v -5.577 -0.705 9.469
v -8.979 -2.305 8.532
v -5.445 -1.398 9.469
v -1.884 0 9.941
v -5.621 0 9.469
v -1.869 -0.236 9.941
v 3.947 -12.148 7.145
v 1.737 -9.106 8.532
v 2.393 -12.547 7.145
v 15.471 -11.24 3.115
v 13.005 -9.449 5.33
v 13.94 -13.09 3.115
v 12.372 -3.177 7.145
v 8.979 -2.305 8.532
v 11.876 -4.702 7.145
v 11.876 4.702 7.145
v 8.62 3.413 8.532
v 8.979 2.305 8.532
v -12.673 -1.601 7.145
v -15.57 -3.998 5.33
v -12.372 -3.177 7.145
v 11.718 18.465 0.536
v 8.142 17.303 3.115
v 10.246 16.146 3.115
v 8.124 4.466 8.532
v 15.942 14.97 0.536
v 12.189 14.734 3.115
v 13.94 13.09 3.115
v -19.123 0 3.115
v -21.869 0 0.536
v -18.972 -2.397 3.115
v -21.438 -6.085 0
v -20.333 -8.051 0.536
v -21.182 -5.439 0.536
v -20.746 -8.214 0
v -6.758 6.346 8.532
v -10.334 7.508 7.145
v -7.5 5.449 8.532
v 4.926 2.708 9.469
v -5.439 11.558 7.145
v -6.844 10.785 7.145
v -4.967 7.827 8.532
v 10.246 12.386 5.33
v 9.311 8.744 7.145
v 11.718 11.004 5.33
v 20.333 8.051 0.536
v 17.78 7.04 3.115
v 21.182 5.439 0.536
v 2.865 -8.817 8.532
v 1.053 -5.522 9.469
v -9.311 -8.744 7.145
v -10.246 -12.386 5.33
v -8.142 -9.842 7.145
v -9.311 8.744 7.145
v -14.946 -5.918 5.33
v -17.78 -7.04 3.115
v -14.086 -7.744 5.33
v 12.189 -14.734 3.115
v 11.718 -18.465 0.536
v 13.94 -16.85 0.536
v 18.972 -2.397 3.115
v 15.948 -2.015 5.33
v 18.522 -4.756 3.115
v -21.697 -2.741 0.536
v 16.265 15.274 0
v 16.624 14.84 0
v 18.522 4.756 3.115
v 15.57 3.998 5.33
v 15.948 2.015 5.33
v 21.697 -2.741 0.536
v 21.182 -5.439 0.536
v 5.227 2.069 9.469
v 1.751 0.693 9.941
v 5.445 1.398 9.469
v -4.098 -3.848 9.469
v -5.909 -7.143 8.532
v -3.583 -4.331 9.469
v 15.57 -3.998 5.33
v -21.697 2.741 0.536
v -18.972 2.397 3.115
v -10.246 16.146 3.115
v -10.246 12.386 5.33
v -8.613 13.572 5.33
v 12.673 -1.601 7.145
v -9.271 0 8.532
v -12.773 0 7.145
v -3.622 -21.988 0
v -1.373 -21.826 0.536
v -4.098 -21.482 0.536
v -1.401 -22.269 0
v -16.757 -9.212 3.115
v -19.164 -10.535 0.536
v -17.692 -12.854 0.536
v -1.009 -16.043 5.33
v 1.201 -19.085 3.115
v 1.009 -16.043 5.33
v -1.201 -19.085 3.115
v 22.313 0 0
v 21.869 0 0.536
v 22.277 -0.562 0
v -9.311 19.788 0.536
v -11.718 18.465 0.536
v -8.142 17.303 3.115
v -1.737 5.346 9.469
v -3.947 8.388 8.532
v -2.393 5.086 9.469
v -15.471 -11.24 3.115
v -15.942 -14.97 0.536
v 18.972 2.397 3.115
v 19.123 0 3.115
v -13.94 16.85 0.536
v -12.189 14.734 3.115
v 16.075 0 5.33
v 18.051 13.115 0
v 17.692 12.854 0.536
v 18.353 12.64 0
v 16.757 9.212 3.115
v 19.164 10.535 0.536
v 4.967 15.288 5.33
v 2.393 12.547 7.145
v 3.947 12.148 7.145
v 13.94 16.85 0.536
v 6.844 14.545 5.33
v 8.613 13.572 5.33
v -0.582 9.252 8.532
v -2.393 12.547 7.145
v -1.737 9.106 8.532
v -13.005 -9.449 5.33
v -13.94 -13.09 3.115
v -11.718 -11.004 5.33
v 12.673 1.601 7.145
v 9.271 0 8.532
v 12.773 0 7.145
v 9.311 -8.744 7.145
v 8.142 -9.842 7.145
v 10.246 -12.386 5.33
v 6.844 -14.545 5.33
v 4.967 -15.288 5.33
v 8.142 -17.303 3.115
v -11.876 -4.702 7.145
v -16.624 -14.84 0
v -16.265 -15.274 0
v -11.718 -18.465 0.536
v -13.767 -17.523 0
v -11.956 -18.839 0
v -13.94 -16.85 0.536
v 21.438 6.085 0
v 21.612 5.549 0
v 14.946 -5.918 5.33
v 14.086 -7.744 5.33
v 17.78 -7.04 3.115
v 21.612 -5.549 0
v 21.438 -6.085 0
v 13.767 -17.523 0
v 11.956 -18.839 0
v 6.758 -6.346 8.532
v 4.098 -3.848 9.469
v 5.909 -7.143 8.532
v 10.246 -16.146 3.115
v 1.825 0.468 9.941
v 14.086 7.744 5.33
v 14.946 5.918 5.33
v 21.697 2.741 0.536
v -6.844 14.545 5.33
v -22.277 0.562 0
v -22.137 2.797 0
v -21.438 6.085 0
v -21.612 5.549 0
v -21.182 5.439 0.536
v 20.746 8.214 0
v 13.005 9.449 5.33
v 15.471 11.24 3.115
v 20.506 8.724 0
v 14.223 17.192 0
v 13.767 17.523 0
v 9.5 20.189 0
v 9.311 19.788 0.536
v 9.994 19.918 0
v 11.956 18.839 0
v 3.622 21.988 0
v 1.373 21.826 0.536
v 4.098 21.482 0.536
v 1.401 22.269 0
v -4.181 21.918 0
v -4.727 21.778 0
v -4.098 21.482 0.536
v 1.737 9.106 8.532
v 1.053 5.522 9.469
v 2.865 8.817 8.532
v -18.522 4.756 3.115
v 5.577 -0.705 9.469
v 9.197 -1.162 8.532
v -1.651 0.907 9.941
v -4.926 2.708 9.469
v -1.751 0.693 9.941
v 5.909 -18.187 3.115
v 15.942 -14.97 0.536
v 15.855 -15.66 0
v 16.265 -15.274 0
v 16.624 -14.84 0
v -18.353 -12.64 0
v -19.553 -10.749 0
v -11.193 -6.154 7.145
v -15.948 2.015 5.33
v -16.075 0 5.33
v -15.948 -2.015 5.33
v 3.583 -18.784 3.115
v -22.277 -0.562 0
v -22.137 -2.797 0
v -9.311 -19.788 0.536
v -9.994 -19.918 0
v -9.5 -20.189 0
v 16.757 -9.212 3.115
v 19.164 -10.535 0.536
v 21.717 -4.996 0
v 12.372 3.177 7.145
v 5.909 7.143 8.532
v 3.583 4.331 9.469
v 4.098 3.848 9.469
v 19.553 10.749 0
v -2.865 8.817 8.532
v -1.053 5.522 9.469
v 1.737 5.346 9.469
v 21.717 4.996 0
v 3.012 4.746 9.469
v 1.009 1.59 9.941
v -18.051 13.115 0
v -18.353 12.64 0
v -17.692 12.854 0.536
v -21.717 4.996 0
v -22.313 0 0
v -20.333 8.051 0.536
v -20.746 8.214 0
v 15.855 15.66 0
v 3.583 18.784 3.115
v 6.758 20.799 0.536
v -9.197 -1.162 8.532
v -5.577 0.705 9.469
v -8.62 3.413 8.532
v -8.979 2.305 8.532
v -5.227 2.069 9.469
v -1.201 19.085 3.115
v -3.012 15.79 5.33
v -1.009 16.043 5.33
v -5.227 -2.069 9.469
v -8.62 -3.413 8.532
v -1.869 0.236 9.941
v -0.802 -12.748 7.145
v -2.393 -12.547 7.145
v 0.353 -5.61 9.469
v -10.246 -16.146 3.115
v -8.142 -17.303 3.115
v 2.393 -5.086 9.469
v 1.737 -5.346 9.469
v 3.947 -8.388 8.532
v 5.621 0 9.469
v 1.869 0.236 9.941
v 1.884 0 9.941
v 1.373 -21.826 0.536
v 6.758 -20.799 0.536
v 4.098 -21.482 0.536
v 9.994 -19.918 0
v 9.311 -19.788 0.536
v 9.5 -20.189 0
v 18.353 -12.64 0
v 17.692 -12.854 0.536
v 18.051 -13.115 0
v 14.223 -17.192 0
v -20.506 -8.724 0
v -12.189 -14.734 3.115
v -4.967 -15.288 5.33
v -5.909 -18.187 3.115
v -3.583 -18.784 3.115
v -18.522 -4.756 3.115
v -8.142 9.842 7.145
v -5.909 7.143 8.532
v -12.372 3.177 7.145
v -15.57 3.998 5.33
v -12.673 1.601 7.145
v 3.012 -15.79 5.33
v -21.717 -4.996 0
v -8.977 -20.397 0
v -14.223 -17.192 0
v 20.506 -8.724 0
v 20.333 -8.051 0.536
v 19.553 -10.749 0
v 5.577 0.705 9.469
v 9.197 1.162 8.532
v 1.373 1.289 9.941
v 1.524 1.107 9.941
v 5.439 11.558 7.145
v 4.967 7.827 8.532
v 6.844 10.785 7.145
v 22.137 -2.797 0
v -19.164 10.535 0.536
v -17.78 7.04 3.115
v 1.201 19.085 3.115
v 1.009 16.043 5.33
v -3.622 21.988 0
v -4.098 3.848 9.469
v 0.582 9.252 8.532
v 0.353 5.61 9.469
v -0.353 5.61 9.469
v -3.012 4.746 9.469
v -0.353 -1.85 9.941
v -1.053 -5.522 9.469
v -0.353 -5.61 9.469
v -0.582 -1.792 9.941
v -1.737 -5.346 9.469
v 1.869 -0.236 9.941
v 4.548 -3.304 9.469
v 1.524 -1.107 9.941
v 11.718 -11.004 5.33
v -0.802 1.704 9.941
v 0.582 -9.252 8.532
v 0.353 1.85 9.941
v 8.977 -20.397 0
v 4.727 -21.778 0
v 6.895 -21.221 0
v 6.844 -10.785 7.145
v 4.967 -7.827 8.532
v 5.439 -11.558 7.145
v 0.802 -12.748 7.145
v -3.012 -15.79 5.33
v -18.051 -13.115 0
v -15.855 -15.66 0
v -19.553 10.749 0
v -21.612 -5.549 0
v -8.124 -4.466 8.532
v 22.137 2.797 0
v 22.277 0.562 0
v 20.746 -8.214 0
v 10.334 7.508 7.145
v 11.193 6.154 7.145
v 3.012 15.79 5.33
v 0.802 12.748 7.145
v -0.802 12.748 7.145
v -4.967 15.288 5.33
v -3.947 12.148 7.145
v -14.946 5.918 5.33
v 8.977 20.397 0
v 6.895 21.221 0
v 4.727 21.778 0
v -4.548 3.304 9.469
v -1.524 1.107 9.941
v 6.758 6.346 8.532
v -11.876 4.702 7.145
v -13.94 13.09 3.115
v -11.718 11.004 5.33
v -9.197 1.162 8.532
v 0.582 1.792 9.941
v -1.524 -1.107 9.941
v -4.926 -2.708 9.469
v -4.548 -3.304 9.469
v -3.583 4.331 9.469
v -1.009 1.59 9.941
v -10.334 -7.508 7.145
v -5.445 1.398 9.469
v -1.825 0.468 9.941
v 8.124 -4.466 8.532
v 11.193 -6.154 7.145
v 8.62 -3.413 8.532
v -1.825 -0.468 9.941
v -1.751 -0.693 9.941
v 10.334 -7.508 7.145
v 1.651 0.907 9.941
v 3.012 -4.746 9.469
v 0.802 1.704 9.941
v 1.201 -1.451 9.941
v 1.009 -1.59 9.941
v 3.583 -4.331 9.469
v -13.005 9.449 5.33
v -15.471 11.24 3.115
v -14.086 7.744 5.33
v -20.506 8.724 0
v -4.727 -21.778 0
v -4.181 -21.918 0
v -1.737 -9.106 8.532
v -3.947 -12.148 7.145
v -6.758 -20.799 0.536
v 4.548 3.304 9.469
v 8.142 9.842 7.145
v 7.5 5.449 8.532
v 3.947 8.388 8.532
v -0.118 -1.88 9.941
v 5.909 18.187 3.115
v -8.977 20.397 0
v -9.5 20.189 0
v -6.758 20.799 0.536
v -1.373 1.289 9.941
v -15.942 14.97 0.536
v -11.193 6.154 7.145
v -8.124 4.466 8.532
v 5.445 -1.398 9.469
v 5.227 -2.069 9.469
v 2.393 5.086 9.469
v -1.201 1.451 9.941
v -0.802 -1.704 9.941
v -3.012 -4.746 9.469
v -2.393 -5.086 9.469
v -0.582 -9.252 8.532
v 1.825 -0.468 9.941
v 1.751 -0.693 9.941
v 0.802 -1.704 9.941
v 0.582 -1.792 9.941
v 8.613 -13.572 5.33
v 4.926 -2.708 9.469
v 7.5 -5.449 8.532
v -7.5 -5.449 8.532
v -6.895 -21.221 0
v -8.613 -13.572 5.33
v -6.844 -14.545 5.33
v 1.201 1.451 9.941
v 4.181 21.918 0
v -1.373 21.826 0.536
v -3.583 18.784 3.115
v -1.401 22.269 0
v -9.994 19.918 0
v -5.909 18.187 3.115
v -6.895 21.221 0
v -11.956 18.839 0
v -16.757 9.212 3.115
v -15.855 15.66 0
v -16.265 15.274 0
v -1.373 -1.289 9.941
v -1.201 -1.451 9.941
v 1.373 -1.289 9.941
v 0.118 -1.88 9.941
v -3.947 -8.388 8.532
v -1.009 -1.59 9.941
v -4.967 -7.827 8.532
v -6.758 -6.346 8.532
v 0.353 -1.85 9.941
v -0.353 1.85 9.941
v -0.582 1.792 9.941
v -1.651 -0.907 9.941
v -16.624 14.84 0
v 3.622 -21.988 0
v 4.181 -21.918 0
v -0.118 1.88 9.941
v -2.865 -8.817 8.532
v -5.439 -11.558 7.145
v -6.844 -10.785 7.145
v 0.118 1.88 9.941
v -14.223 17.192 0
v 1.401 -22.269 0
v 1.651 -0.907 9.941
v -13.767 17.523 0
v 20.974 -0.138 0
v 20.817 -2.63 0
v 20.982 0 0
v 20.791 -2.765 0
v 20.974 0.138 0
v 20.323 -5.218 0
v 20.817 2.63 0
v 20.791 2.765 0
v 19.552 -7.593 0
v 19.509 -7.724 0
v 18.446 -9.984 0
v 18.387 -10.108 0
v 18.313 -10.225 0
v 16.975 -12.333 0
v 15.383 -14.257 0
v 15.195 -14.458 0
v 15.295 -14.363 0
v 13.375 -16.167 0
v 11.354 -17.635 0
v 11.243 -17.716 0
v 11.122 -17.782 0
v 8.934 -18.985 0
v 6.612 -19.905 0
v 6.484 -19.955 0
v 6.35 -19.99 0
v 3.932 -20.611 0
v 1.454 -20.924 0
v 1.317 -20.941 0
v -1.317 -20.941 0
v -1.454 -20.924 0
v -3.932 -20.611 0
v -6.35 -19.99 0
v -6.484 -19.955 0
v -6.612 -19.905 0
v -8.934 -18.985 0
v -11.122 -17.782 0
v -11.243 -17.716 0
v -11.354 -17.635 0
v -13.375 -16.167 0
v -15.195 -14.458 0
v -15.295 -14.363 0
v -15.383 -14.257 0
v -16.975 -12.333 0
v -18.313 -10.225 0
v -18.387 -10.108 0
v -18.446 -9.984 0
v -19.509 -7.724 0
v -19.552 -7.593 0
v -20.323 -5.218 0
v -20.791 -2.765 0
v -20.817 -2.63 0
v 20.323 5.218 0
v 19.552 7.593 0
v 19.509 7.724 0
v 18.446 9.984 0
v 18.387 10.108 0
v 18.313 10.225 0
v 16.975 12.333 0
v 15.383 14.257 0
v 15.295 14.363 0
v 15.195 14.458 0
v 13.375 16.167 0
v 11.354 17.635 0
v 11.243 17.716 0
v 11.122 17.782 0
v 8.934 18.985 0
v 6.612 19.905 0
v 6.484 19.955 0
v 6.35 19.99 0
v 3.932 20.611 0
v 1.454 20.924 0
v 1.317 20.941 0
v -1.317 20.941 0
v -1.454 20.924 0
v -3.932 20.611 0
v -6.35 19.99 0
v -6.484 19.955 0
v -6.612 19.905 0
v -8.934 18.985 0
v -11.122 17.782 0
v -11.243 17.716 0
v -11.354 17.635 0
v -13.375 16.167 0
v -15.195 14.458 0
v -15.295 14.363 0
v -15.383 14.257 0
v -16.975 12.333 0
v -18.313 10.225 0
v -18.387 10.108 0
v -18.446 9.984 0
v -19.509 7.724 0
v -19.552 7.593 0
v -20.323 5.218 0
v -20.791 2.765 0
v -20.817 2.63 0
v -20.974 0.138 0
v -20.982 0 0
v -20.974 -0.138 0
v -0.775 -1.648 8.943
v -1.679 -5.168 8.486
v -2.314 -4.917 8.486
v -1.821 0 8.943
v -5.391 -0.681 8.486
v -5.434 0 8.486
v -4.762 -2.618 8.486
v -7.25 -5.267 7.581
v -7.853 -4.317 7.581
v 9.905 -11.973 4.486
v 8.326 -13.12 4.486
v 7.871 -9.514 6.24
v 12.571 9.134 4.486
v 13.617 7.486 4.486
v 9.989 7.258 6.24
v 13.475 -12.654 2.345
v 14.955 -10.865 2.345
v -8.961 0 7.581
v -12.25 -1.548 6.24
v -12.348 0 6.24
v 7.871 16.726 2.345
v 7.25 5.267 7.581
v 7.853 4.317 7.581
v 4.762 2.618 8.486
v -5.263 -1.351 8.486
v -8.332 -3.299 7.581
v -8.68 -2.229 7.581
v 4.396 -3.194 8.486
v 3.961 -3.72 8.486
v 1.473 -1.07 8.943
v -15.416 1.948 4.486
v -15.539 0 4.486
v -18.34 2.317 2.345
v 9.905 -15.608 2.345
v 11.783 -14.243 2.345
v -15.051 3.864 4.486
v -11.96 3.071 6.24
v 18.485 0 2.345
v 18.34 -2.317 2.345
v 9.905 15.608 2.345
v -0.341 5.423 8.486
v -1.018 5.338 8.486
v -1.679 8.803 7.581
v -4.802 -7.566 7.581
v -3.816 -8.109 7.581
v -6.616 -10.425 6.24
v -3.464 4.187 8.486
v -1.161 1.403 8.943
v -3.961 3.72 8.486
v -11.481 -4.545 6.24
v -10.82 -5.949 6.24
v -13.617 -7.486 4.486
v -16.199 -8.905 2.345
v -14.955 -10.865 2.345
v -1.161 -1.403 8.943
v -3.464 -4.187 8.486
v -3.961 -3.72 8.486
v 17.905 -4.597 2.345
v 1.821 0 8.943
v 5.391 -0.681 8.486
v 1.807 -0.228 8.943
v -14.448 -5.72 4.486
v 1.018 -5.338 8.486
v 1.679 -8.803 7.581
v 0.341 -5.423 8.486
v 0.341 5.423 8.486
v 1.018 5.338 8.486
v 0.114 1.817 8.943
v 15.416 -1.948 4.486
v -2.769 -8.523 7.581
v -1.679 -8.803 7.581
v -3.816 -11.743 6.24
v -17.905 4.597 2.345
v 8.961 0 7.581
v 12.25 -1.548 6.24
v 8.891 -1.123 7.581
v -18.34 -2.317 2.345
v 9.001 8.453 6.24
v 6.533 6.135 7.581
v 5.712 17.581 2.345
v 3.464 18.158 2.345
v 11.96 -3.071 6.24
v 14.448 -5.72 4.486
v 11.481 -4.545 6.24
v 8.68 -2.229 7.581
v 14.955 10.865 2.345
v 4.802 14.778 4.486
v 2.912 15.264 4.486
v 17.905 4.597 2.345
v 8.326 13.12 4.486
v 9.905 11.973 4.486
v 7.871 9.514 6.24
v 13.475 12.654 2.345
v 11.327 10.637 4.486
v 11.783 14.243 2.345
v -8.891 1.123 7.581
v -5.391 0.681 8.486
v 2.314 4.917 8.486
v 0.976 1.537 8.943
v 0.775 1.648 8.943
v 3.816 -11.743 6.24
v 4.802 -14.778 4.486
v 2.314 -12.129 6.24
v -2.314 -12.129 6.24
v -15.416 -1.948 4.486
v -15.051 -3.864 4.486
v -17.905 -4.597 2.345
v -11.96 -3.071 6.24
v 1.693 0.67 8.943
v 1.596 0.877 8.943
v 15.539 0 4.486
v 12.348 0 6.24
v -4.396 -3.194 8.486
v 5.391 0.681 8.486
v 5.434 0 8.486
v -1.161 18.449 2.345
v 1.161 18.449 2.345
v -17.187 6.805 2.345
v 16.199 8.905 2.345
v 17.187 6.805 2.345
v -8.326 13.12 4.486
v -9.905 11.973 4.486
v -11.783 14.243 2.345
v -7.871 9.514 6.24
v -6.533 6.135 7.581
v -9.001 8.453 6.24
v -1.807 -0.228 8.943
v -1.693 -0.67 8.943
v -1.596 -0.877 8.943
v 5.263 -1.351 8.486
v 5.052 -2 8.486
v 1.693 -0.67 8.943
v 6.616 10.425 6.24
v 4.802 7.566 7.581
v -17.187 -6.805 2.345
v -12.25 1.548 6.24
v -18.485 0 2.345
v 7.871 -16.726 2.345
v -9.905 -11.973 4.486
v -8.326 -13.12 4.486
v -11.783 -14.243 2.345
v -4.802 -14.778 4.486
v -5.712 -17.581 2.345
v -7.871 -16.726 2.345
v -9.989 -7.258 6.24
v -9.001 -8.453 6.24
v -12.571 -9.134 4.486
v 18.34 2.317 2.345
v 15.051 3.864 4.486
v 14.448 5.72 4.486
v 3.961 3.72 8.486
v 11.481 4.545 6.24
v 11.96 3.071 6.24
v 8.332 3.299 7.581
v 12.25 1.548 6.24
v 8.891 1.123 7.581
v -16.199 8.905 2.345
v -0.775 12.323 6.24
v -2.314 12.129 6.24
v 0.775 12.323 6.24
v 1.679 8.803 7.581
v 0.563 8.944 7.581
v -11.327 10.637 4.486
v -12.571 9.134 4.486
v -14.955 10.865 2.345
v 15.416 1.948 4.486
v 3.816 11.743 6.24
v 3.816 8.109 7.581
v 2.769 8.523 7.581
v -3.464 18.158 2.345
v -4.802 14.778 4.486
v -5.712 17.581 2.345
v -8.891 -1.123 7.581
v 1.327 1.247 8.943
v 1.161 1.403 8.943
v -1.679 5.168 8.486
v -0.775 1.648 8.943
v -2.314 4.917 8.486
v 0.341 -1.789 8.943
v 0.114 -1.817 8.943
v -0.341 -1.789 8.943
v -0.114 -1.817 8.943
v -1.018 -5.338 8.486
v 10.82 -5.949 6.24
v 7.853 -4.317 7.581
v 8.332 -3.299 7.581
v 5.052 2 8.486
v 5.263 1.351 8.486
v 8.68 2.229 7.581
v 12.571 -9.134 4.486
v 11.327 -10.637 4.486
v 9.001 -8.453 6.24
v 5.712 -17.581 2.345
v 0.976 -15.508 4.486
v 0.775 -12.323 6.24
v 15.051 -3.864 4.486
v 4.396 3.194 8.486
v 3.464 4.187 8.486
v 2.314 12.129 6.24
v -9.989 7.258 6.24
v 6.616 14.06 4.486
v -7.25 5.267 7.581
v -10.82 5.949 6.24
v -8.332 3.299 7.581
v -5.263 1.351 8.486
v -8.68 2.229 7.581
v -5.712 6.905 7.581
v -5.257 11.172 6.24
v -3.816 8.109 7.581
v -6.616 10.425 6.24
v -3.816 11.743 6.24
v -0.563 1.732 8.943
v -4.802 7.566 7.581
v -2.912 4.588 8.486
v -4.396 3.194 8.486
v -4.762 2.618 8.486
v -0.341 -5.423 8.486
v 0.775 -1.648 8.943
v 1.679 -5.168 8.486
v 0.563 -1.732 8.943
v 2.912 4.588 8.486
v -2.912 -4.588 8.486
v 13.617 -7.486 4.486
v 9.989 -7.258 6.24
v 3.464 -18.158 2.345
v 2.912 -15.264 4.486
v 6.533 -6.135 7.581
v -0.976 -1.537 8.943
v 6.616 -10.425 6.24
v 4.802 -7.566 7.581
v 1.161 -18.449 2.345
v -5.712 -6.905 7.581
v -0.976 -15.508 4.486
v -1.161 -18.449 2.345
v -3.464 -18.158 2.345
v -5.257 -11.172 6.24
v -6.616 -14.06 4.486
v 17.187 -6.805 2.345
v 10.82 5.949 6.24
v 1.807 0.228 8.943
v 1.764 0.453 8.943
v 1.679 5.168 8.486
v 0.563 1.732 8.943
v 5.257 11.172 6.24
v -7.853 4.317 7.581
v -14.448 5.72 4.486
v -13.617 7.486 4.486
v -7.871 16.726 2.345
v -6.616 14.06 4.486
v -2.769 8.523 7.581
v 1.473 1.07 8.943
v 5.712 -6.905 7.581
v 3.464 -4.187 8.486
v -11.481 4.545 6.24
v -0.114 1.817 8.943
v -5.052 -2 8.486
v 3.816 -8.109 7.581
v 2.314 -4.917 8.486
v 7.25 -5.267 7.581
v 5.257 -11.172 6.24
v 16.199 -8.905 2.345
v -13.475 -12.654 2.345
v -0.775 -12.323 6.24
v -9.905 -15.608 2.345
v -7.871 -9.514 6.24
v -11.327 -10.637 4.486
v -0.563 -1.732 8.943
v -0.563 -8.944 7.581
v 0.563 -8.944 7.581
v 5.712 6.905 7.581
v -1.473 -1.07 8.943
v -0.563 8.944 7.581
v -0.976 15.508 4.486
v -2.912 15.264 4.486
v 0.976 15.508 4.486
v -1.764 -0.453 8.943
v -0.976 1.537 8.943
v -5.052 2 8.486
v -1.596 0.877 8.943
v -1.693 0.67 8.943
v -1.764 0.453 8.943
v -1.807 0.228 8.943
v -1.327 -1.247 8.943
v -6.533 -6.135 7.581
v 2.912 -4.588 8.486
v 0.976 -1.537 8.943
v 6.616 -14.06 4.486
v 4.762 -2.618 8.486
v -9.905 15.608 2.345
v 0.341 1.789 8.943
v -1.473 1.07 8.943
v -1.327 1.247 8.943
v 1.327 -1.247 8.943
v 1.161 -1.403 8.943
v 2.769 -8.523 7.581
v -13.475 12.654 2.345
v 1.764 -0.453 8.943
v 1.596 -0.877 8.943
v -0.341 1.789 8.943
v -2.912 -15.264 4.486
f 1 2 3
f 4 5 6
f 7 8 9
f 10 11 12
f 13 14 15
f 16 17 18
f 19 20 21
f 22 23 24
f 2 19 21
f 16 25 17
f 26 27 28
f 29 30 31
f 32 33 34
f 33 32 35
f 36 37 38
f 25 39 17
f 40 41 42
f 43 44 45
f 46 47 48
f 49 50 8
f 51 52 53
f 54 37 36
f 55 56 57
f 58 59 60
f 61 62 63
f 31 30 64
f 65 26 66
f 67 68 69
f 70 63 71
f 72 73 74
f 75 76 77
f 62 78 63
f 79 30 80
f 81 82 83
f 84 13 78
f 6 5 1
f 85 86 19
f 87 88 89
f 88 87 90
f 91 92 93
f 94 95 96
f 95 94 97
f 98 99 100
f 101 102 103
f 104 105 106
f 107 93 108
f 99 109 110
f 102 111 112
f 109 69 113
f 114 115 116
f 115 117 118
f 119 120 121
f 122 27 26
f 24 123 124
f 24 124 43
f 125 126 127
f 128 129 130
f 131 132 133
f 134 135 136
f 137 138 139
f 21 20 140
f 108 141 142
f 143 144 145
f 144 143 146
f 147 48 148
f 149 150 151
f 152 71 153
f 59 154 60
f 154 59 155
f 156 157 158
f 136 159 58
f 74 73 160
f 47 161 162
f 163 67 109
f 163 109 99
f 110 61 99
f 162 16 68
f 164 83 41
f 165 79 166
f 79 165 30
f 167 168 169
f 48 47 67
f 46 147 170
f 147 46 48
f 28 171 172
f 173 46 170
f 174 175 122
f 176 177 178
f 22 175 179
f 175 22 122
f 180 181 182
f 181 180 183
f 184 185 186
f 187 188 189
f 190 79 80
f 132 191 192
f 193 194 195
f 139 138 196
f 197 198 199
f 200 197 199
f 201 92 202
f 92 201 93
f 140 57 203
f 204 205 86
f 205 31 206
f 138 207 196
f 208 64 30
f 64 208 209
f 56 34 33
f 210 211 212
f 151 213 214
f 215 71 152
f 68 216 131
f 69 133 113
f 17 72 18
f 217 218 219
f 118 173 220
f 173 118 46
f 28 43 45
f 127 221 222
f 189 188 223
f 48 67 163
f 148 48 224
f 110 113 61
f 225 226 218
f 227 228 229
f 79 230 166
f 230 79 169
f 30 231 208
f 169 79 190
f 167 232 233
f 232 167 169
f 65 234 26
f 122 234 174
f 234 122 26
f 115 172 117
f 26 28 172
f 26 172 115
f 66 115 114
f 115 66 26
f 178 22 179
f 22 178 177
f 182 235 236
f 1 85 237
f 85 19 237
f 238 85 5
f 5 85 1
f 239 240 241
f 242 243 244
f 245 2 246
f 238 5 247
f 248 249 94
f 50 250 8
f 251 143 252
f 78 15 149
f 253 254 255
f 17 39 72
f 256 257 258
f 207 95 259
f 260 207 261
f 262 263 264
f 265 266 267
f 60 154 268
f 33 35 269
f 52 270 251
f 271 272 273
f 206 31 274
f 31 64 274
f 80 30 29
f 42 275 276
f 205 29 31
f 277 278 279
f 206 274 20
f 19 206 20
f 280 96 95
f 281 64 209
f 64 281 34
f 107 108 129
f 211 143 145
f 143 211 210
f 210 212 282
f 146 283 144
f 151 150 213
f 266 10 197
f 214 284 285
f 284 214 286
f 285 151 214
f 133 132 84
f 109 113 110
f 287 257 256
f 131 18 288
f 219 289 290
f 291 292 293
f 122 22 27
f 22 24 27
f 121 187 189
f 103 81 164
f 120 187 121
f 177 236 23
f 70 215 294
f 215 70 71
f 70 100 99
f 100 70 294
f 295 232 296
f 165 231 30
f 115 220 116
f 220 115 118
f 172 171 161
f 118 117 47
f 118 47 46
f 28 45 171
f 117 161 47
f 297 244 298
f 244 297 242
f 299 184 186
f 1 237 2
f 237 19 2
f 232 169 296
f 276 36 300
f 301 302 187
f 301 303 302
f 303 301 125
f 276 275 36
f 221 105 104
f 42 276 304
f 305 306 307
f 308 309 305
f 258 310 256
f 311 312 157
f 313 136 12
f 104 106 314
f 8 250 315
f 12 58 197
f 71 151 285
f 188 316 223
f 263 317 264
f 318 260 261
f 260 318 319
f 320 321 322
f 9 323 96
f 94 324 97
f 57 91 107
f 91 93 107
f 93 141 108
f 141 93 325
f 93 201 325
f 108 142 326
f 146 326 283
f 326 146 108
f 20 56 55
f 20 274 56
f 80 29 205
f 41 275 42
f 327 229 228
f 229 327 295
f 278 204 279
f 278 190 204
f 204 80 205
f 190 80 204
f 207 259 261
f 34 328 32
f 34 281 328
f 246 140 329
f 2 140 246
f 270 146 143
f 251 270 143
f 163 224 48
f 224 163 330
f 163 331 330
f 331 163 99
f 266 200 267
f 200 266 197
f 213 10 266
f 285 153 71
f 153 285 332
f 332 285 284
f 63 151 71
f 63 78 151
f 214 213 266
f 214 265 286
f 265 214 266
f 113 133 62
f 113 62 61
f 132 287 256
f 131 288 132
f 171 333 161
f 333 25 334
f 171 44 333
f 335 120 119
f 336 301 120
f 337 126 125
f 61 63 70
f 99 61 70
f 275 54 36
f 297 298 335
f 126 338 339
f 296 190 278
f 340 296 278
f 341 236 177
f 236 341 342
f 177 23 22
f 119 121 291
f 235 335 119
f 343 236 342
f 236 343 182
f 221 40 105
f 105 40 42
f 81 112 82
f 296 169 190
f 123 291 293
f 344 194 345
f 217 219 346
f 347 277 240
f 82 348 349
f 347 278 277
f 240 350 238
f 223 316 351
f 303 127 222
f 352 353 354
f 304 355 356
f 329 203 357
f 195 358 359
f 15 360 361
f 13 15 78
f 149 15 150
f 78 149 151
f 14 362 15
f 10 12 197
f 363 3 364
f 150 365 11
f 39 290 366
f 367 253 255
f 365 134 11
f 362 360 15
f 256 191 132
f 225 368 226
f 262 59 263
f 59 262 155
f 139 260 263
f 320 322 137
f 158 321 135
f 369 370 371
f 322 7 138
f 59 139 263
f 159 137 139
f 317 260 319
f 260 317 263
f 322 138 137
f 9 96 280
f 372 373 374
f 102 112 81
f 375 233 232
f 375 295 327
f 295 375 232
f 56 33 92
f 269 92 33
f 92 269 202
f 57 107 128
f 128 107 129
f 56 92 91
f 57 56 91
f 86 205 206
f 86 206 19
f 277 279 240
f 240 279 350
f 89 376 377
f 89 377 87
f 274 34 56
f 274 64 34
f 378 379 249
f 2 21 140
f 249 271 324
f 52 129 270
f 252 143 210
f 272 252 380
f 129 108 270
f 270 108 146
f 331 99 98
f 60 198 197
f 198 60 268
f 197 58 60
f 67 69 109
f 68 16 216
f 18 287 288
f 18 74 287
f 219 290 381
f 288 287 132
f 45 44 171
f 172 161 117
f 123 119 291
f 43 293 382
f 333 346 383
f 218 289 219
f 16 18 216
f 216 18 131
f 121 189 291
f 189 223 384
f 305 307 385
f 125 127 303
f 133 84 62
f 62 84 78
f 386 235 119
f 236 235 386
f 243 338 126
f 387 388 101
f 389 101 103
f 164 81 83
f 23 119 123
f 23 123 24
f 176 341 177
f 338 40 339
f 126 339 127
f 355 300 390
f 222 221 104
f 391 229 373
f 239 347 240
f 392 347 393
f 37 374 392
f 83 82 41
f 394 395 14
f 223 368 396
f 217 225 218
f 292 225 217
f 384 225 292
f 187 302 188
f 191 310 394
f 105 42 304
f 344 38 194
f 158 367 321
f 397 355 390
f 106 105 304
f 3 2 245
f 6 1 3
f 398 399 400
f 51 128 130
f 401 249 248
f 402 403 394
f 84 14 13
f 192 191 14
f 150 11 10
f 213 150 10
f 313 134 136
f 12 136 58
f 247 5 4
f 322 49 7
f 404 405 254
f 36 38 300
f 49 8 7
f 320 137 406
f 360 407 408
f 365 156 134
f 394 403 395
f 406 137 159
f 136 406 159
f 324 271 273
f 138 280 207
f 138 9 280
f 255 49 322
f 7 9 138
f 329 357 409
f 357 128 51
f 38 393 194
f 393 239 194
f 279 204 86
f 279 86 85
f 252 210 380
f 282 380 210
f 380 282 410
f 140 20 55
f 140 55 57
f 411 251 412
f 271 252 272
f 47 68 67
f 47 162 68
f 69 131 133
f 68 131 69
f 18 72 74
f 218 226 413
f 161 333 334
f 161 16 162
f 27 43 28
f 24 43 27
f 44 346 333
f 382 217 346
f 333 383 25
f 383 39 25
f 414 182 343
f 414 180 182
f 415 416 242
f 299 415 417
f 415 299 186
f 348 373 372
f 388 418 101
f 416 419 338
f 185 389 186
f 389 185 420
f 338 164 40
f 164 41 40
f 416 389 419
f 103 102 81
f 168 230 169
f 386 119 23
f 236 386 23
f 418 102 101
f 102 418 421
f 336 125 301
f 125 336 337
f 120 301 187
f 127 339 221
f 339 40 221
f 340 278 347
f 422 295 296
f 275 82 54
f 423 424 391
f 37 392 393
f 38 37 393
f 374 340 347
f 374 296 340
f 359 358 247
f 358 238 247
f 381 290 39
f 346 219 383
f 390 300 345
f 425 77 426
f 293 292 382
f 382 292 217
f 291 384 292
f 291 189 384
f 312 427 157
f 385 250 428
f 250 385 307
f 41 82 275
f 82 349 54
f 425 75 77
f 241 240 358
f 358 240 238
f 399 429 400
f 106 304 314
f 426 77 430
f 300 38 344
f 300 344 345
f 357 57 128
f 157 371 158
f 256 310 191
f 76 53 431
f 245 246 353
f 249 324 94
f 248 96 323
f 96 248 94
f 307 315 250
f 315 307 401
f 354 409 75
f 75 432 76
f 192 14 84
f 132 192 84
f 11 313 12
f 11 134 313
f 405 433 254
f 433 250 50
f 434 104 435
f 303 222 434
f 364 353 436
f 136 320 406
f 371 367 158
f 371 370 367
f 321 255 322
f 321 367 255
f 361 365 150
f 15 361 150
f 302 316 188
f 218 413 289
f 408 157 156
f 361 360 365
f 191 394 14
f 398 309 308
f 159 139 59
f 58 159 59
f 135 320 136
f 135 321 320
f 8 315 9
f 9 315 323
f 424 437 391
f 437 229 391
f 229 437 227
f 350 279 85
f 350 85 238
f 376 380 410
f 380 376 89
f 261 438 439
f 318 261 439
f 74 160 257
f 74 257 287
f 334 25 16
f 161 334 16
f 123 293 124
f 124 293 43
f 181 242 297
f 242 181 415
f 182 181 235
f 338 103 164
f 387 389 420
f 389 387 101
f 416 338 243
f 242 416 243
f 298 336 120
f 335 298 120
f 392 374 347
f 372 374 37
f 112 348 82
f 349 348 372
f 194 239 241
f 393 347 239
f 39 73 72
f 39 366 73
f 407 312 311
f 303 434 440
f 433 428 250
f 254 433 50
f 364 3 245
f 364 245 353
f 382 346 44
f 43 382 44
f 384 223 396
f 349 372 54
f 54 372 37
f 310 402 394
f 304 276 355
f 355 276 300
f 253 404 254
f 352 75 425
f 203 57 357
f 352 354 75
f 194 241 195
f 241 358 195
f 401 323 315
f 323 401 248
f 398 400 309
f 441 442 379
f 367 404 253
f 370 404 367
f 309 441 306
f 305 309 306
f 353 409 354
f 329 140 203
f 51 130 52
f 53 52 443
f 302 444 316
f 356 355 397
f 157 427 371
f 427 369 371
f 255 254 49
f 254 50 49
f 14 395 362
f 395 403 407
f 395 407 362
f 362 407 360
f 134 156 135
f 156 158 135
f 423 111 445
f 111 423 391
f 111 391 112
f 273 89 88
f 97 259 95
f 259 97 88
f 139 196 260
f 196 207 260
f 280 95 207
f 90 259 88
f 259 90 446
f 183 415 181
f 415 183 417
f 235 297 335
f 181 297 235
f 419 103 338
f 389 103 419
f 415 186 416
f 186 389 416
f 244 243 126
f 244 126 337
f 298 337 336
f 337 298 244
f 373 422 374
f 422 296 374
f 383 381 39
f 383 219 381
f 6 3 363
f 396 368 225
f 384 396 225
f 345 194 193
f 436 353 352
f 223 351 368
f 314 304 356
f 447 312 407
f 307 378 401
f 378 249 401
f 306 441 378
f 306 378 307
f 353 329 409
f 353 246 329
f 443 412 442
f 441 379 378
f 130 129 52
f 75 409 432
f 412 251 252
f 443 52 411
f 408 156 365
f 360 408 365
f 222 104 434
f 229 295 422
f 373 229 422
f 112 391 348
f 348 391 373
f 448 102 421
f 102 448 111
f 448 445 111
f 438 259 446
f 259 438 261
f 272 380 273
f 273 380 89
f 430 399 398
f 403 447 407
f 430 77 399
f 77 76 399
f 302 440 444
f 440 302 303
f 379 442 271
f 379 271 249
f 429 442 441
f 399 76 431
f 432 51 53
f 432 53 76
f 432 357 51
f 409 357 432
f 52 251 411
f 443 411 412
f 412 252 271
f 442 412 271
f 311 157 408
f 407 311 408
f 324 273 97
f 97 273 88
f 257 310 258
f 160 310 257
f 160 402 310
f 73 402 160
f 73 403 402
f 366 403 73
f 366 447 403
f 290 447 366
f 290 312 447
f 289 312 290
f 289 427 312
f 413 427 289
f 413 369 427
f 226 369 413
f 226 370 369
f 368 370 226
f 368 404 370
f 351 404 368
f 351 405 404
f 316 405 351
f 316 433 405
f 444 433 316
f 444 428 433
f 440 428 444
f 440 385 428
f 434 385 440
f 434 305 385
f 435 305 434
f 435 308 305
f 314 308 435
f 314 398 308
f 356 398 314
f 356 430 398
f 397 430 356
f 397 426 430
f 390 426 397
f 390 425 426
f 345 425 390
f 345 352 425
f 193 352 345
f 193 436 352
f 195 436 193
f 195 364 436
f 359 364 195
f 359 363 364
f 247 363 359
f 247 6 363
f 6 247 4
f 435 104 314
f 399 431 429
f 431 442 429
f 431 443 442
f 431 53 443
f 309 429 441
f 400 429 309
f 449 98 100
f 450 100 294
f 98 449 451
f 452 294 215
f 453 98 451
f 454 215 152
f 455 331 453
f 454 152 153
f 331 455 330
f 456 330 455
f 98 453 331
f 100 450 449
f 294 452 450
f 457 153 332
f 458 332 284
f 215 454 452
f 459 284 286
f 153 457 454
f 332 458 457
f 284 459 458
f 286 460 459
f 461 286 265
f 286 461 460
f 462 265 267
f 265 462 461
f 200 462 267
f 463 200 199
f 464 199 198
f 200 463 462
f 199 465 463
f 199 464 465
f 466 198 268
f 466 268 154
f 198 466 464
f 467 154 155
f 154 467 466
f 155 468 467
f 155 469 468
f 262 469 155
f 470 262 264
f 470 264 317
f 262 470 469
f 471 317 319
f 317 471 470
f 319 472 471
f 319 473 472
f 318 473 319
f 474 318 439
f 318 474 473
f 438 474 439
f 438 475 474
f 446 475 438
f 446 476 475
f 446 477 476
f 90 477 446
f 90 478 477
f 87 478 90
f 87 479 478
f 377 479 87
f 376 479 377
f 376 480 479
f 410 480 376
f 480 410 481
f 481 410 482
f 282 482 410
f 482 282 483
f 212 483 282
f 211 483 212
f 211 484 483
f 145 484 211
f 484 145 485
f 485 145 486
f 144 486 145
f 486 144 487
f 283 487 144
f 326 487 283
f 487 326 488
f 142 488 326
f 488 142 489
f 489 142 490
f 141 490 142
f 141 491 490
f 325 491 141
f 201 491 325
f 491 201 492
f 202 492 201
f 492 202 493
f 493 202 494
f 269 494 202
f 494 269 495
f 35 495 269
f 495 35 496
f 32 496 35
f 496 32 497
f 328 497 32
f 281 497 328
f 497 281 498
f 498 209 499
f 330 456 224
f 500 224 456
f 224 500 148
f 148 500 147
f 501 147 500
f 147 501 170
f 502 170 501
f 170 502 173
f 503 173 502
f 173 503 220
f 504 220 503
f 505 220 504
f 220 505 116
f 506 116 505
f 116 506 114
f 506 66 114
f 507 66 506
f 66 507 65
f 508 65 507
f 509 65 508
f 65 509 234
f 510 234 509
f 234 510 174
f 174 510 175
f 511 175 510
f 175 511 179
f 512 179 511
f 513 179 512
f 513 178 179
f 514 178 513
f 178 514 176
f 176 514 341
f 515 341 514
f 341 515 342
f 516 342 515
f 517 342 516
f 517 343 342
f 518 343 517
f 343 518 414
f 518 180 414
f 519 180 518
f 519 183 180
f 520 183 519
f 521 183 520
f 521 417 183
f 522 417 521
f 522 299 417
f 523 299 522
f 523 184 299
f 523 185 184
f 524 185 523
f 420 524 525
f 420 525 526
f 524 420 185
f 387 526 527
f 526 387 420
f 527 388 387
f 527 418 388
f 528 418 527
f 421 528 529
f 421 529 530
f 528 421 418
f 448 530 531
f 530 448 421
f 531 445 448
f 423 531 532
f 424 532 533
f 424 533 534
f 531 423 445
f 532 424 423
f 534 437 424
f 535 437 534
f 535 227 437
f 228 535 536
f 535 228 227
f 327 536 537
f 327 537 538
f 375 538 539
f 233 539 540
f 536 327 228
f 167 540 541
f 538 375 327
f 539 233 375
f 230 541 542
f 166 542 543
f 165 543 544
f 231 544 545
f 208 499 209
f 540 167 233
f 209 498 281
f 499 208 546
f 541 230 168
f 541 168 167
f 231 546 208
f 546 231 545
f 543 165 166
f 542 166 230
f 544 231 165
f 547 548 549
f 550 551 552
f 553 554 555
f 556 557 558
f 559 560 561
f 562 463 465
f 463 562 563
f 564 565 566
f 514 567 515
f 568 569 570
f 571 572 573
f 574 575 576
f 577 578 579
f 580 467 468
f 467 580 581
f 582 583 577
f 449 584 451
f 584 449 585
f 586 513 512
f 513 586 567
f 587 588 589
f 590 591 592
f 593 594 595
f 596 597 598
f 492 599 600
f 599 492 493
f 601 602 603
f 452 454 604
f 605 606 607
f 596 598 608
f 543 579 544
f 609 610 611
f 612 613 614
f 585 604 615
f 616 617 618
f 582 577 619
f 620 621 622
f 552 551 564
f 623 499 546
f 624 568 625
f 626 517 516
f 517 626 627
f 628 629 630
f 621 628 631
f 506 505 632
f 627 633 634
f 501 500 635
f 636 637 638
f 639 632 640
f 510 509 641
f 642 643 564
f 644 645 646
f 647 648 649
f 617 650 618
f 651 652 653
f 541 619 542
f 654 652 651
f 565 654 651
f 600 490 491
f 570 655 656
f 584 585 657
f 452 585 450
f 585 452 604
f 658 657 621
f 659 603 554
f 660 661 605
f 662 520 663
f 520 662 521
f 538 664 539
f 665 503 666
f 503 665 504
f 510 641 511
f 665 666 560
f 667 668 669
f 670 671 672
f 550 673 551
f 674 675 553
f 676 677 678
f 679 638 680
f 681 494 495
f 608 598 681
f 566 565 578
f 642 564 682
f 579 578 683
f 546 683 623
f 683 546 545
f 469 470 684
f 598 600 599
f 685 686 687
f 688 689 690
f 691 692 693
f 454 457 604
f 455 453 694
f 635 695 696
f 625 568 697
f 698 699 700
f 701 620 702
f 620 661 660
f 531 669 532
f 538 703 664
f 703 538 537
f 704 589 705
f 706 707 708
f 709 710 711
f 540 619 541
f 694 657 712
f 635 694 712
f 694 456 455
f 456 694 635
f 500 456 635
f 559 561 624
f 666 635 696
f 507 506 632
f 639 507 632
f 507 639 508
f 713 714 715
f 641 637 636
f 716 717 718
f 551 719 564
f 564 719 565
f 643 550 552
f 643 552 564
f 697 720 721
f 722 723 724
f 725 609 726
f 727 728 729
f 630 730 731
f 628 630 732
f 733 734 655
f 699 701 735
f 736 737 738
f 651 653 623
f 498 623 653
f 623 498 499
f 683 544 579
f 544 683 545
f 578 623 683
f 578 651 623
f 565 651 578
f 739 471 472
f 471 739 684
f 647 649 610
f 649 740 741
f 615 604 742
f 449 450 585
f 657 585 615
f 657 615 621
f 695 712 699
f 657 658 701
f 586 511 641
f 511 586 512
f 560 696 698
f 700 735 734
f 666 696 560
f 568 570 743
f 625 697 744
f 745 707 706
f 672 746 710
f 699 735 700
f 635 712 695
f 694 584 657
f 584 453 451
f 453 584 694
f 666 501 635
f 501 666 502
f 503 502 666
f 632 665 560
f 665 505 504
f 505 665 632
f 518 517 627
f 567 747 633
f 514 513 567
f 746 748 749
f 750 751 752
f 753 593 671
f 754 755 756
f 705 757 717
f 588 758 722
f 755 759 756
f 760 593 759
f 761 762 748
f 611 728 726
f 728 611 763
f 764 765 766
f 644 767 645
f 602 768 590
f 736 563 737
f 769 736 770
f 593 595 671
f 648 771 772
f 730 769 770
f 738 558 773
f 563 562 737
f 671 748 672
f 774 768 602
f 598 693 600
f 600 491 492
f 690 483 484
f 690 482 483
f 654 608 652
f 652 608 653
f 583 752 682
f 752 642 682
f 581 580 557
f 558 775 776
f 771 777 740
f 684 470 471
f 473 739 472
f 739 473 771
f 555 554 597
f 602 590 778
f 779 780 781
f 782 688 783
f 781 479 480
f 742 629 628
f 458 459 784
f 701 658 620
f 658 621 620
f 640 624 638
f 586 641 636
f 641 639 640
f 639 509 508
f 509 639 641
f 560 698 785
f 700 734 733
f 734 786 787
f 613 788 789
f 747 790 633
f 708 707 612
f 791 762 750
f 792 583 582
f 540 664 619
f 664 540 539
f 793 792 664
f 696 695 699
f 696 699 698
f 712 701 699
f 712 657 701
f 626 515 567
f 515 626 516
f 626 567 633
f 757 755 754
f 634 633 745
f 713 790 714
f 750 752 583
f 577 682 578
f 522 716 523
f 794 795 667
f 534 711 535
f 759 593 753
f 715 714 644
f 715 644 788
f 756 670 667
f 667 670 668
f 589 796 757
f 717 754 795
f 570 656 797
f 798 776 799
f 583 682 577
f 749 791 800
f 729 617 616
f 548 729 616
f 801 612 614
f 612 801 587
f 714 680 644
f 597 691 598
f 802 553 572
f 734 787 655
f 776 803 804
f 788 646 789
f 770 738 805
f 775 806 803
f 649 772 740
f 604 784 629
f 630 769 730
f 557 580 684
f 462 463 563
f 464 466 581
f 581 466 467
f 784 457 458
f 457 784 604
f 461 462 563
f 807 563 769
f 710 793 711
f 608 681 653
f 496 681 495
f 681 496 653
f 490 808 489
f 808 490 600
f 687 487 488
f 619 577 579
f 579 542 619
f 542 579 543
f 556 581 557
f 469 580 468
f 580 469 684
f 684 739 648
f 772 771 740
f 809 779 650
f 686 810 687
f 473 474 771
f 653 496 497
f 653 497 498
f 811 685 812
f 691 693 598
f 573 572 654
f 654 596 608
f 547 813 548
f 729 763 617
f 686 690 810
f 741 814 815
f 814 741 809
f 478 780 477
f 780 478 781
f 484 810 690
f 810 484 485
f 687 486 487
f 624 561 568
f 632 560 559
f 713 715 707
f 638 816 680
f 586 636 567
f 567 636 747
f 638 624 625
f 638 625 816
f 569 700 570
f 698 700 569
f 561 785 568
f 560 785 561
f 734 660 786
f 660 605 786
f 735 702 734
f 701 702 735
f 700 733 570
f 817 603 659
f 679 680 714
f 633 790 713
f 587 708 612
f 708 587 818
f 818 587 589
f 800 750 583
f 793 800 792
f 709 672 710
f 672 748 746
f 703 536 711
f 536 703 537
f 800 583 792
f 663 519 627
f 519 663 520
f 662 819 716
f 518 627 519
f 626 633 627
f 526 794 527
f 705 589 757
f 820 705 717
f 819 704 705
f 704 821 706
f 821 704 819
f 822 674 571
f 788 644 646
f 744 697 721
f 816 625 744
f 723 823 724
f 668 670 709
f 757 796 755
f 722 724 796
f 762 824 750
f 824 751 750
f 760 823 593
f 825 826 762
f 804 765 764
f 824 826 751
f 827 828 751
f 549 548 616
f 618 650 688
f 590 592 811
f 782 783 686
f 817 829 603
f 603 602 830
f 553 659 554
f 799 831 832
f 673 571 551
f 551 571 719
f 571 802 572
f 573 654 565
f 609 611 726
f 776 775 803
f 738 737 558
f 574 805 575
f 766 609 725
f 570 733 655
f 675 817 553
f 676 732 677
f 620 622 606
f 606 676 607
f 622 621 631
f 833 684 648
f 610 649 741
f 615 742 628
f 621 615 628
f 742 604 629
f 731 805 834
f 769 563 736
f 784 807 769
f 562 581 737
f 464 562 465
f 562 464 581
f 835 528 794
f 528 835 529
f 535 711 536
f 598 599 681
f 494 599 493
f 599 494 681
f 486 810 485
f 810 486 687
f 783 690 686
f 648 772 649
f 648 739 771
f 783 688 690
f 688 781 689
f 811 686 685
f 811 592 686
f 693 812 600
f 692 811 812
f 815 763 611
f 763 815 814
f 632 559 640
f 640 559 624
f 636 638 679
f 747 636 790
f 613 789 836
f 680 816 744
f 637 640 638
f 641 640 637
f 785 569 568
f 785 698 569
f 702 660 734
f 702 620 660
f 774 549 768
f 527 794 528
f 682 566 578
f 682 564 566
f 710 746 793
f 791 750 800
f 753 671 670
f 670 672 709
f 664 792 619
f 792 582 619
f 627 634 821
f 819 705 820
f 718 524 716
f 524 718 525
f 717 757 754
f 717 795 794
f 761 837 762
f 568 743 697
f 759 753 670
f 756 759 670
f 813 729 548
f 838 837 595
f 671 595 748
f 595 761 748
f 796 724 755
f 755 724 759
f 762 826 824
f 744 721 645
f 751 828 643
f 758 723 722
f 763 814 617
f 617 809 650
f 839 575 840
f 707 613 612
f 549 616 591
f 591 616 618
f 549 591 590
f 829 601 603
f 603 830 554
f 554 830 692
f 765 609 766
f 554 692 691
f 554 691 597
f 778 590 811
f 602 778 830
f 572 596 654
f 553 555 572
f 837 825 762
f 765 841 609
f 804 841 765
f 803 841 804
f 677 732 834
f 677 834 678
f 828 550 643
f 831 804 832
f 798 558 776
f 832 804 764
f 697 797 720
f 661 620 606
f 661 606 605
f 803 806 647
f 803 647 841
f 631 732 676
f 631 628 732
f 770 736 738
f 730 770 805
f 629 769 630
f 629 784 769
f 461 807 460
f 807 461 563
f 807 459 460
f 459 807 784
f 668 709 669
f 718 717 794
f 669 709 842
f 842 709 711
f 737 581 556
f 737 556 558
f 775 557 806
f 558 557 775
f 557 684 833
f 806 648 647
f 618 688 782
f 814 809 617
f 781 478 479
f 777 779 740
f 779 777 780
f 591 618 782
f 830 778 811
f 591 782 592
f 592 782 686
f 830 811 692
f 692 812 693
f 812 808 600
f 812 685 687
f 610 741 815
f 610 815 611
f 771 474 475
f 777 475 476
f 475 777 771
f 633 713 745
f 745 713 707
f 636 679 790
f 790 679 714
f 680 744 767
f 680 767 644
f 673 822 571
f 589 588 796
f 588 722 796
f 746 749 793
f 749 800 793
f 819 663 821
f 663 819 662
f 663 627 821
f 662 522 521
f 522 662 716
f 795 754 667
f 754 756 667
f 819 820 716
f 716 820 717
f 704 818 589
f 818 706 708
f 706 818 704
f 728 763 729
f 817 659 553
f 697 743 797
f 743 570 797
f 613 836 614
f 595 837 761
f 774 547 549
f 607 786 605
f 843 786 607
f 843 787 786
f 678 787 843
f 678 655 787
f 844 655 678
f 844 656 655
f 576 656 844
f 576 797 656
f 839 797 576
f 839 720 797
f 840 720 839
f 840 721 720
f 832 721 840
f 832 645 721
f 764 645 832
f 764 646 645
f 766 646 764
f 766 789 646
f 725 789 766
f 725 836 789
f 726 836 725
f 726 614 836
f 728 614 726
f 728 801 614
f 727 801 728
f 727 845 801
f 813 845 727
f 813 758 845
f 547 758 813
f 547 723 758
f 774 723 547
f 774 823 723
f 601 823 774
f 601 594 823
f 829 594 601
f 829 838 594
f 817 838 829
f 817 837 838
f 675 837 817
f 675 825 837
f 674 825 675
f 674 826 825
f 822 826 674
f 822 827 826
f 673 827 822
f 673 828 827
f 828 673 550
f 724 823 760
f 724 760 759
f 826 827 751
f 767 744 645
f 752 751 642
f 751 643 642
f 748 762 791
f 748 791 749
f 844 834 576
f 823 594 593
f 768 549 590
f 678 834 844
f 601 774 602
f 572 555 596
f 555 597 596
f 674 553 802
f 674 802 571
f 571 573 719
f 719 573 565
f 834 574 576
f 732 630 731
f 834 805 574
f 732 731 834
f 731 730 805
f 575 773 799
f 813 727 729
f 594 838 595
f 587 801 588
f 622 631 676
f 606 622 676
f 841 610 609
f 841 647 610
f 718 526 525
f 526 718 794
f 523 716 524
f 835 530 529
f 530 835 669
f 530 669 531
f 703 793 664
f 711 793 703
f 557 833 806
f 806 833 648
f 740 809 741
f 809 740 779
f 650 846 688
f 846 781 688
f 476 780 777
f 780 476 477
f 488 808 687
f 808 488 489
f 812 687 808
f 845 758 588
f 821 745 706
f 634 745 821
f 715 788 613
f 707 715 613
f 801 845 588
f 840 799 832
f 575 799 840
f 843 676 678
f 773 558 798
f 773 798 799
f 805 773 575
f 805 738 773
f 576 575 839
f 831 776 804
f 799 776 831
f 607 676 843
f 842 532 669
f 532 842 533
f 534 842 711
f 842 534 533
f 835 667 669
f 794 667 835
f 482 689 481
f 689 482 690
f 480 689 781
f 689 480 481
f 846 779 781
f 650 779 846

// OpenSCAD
// Not an actual lens, useful as frosted cover for a light.
// Hari Wiguna, 2015

// Outer radius of the base of the lens
r = 30;

// Height of the lens (from base to center top of lens)
h = 10;

// How thick is the lens itself
thickness = 1;

// Resolution
res = 50;

$fn = res;
rs = r - thickness;

translate([0,0,-(r-h)])
    lens();

module lens()
{
    difference()
    {
        intersection()
        {
            sphere(r);        

            translate([-r,-r,r-h])
                cube([2*r,2*r,h]);    
        }

        sphere(rs);        
    }
}
